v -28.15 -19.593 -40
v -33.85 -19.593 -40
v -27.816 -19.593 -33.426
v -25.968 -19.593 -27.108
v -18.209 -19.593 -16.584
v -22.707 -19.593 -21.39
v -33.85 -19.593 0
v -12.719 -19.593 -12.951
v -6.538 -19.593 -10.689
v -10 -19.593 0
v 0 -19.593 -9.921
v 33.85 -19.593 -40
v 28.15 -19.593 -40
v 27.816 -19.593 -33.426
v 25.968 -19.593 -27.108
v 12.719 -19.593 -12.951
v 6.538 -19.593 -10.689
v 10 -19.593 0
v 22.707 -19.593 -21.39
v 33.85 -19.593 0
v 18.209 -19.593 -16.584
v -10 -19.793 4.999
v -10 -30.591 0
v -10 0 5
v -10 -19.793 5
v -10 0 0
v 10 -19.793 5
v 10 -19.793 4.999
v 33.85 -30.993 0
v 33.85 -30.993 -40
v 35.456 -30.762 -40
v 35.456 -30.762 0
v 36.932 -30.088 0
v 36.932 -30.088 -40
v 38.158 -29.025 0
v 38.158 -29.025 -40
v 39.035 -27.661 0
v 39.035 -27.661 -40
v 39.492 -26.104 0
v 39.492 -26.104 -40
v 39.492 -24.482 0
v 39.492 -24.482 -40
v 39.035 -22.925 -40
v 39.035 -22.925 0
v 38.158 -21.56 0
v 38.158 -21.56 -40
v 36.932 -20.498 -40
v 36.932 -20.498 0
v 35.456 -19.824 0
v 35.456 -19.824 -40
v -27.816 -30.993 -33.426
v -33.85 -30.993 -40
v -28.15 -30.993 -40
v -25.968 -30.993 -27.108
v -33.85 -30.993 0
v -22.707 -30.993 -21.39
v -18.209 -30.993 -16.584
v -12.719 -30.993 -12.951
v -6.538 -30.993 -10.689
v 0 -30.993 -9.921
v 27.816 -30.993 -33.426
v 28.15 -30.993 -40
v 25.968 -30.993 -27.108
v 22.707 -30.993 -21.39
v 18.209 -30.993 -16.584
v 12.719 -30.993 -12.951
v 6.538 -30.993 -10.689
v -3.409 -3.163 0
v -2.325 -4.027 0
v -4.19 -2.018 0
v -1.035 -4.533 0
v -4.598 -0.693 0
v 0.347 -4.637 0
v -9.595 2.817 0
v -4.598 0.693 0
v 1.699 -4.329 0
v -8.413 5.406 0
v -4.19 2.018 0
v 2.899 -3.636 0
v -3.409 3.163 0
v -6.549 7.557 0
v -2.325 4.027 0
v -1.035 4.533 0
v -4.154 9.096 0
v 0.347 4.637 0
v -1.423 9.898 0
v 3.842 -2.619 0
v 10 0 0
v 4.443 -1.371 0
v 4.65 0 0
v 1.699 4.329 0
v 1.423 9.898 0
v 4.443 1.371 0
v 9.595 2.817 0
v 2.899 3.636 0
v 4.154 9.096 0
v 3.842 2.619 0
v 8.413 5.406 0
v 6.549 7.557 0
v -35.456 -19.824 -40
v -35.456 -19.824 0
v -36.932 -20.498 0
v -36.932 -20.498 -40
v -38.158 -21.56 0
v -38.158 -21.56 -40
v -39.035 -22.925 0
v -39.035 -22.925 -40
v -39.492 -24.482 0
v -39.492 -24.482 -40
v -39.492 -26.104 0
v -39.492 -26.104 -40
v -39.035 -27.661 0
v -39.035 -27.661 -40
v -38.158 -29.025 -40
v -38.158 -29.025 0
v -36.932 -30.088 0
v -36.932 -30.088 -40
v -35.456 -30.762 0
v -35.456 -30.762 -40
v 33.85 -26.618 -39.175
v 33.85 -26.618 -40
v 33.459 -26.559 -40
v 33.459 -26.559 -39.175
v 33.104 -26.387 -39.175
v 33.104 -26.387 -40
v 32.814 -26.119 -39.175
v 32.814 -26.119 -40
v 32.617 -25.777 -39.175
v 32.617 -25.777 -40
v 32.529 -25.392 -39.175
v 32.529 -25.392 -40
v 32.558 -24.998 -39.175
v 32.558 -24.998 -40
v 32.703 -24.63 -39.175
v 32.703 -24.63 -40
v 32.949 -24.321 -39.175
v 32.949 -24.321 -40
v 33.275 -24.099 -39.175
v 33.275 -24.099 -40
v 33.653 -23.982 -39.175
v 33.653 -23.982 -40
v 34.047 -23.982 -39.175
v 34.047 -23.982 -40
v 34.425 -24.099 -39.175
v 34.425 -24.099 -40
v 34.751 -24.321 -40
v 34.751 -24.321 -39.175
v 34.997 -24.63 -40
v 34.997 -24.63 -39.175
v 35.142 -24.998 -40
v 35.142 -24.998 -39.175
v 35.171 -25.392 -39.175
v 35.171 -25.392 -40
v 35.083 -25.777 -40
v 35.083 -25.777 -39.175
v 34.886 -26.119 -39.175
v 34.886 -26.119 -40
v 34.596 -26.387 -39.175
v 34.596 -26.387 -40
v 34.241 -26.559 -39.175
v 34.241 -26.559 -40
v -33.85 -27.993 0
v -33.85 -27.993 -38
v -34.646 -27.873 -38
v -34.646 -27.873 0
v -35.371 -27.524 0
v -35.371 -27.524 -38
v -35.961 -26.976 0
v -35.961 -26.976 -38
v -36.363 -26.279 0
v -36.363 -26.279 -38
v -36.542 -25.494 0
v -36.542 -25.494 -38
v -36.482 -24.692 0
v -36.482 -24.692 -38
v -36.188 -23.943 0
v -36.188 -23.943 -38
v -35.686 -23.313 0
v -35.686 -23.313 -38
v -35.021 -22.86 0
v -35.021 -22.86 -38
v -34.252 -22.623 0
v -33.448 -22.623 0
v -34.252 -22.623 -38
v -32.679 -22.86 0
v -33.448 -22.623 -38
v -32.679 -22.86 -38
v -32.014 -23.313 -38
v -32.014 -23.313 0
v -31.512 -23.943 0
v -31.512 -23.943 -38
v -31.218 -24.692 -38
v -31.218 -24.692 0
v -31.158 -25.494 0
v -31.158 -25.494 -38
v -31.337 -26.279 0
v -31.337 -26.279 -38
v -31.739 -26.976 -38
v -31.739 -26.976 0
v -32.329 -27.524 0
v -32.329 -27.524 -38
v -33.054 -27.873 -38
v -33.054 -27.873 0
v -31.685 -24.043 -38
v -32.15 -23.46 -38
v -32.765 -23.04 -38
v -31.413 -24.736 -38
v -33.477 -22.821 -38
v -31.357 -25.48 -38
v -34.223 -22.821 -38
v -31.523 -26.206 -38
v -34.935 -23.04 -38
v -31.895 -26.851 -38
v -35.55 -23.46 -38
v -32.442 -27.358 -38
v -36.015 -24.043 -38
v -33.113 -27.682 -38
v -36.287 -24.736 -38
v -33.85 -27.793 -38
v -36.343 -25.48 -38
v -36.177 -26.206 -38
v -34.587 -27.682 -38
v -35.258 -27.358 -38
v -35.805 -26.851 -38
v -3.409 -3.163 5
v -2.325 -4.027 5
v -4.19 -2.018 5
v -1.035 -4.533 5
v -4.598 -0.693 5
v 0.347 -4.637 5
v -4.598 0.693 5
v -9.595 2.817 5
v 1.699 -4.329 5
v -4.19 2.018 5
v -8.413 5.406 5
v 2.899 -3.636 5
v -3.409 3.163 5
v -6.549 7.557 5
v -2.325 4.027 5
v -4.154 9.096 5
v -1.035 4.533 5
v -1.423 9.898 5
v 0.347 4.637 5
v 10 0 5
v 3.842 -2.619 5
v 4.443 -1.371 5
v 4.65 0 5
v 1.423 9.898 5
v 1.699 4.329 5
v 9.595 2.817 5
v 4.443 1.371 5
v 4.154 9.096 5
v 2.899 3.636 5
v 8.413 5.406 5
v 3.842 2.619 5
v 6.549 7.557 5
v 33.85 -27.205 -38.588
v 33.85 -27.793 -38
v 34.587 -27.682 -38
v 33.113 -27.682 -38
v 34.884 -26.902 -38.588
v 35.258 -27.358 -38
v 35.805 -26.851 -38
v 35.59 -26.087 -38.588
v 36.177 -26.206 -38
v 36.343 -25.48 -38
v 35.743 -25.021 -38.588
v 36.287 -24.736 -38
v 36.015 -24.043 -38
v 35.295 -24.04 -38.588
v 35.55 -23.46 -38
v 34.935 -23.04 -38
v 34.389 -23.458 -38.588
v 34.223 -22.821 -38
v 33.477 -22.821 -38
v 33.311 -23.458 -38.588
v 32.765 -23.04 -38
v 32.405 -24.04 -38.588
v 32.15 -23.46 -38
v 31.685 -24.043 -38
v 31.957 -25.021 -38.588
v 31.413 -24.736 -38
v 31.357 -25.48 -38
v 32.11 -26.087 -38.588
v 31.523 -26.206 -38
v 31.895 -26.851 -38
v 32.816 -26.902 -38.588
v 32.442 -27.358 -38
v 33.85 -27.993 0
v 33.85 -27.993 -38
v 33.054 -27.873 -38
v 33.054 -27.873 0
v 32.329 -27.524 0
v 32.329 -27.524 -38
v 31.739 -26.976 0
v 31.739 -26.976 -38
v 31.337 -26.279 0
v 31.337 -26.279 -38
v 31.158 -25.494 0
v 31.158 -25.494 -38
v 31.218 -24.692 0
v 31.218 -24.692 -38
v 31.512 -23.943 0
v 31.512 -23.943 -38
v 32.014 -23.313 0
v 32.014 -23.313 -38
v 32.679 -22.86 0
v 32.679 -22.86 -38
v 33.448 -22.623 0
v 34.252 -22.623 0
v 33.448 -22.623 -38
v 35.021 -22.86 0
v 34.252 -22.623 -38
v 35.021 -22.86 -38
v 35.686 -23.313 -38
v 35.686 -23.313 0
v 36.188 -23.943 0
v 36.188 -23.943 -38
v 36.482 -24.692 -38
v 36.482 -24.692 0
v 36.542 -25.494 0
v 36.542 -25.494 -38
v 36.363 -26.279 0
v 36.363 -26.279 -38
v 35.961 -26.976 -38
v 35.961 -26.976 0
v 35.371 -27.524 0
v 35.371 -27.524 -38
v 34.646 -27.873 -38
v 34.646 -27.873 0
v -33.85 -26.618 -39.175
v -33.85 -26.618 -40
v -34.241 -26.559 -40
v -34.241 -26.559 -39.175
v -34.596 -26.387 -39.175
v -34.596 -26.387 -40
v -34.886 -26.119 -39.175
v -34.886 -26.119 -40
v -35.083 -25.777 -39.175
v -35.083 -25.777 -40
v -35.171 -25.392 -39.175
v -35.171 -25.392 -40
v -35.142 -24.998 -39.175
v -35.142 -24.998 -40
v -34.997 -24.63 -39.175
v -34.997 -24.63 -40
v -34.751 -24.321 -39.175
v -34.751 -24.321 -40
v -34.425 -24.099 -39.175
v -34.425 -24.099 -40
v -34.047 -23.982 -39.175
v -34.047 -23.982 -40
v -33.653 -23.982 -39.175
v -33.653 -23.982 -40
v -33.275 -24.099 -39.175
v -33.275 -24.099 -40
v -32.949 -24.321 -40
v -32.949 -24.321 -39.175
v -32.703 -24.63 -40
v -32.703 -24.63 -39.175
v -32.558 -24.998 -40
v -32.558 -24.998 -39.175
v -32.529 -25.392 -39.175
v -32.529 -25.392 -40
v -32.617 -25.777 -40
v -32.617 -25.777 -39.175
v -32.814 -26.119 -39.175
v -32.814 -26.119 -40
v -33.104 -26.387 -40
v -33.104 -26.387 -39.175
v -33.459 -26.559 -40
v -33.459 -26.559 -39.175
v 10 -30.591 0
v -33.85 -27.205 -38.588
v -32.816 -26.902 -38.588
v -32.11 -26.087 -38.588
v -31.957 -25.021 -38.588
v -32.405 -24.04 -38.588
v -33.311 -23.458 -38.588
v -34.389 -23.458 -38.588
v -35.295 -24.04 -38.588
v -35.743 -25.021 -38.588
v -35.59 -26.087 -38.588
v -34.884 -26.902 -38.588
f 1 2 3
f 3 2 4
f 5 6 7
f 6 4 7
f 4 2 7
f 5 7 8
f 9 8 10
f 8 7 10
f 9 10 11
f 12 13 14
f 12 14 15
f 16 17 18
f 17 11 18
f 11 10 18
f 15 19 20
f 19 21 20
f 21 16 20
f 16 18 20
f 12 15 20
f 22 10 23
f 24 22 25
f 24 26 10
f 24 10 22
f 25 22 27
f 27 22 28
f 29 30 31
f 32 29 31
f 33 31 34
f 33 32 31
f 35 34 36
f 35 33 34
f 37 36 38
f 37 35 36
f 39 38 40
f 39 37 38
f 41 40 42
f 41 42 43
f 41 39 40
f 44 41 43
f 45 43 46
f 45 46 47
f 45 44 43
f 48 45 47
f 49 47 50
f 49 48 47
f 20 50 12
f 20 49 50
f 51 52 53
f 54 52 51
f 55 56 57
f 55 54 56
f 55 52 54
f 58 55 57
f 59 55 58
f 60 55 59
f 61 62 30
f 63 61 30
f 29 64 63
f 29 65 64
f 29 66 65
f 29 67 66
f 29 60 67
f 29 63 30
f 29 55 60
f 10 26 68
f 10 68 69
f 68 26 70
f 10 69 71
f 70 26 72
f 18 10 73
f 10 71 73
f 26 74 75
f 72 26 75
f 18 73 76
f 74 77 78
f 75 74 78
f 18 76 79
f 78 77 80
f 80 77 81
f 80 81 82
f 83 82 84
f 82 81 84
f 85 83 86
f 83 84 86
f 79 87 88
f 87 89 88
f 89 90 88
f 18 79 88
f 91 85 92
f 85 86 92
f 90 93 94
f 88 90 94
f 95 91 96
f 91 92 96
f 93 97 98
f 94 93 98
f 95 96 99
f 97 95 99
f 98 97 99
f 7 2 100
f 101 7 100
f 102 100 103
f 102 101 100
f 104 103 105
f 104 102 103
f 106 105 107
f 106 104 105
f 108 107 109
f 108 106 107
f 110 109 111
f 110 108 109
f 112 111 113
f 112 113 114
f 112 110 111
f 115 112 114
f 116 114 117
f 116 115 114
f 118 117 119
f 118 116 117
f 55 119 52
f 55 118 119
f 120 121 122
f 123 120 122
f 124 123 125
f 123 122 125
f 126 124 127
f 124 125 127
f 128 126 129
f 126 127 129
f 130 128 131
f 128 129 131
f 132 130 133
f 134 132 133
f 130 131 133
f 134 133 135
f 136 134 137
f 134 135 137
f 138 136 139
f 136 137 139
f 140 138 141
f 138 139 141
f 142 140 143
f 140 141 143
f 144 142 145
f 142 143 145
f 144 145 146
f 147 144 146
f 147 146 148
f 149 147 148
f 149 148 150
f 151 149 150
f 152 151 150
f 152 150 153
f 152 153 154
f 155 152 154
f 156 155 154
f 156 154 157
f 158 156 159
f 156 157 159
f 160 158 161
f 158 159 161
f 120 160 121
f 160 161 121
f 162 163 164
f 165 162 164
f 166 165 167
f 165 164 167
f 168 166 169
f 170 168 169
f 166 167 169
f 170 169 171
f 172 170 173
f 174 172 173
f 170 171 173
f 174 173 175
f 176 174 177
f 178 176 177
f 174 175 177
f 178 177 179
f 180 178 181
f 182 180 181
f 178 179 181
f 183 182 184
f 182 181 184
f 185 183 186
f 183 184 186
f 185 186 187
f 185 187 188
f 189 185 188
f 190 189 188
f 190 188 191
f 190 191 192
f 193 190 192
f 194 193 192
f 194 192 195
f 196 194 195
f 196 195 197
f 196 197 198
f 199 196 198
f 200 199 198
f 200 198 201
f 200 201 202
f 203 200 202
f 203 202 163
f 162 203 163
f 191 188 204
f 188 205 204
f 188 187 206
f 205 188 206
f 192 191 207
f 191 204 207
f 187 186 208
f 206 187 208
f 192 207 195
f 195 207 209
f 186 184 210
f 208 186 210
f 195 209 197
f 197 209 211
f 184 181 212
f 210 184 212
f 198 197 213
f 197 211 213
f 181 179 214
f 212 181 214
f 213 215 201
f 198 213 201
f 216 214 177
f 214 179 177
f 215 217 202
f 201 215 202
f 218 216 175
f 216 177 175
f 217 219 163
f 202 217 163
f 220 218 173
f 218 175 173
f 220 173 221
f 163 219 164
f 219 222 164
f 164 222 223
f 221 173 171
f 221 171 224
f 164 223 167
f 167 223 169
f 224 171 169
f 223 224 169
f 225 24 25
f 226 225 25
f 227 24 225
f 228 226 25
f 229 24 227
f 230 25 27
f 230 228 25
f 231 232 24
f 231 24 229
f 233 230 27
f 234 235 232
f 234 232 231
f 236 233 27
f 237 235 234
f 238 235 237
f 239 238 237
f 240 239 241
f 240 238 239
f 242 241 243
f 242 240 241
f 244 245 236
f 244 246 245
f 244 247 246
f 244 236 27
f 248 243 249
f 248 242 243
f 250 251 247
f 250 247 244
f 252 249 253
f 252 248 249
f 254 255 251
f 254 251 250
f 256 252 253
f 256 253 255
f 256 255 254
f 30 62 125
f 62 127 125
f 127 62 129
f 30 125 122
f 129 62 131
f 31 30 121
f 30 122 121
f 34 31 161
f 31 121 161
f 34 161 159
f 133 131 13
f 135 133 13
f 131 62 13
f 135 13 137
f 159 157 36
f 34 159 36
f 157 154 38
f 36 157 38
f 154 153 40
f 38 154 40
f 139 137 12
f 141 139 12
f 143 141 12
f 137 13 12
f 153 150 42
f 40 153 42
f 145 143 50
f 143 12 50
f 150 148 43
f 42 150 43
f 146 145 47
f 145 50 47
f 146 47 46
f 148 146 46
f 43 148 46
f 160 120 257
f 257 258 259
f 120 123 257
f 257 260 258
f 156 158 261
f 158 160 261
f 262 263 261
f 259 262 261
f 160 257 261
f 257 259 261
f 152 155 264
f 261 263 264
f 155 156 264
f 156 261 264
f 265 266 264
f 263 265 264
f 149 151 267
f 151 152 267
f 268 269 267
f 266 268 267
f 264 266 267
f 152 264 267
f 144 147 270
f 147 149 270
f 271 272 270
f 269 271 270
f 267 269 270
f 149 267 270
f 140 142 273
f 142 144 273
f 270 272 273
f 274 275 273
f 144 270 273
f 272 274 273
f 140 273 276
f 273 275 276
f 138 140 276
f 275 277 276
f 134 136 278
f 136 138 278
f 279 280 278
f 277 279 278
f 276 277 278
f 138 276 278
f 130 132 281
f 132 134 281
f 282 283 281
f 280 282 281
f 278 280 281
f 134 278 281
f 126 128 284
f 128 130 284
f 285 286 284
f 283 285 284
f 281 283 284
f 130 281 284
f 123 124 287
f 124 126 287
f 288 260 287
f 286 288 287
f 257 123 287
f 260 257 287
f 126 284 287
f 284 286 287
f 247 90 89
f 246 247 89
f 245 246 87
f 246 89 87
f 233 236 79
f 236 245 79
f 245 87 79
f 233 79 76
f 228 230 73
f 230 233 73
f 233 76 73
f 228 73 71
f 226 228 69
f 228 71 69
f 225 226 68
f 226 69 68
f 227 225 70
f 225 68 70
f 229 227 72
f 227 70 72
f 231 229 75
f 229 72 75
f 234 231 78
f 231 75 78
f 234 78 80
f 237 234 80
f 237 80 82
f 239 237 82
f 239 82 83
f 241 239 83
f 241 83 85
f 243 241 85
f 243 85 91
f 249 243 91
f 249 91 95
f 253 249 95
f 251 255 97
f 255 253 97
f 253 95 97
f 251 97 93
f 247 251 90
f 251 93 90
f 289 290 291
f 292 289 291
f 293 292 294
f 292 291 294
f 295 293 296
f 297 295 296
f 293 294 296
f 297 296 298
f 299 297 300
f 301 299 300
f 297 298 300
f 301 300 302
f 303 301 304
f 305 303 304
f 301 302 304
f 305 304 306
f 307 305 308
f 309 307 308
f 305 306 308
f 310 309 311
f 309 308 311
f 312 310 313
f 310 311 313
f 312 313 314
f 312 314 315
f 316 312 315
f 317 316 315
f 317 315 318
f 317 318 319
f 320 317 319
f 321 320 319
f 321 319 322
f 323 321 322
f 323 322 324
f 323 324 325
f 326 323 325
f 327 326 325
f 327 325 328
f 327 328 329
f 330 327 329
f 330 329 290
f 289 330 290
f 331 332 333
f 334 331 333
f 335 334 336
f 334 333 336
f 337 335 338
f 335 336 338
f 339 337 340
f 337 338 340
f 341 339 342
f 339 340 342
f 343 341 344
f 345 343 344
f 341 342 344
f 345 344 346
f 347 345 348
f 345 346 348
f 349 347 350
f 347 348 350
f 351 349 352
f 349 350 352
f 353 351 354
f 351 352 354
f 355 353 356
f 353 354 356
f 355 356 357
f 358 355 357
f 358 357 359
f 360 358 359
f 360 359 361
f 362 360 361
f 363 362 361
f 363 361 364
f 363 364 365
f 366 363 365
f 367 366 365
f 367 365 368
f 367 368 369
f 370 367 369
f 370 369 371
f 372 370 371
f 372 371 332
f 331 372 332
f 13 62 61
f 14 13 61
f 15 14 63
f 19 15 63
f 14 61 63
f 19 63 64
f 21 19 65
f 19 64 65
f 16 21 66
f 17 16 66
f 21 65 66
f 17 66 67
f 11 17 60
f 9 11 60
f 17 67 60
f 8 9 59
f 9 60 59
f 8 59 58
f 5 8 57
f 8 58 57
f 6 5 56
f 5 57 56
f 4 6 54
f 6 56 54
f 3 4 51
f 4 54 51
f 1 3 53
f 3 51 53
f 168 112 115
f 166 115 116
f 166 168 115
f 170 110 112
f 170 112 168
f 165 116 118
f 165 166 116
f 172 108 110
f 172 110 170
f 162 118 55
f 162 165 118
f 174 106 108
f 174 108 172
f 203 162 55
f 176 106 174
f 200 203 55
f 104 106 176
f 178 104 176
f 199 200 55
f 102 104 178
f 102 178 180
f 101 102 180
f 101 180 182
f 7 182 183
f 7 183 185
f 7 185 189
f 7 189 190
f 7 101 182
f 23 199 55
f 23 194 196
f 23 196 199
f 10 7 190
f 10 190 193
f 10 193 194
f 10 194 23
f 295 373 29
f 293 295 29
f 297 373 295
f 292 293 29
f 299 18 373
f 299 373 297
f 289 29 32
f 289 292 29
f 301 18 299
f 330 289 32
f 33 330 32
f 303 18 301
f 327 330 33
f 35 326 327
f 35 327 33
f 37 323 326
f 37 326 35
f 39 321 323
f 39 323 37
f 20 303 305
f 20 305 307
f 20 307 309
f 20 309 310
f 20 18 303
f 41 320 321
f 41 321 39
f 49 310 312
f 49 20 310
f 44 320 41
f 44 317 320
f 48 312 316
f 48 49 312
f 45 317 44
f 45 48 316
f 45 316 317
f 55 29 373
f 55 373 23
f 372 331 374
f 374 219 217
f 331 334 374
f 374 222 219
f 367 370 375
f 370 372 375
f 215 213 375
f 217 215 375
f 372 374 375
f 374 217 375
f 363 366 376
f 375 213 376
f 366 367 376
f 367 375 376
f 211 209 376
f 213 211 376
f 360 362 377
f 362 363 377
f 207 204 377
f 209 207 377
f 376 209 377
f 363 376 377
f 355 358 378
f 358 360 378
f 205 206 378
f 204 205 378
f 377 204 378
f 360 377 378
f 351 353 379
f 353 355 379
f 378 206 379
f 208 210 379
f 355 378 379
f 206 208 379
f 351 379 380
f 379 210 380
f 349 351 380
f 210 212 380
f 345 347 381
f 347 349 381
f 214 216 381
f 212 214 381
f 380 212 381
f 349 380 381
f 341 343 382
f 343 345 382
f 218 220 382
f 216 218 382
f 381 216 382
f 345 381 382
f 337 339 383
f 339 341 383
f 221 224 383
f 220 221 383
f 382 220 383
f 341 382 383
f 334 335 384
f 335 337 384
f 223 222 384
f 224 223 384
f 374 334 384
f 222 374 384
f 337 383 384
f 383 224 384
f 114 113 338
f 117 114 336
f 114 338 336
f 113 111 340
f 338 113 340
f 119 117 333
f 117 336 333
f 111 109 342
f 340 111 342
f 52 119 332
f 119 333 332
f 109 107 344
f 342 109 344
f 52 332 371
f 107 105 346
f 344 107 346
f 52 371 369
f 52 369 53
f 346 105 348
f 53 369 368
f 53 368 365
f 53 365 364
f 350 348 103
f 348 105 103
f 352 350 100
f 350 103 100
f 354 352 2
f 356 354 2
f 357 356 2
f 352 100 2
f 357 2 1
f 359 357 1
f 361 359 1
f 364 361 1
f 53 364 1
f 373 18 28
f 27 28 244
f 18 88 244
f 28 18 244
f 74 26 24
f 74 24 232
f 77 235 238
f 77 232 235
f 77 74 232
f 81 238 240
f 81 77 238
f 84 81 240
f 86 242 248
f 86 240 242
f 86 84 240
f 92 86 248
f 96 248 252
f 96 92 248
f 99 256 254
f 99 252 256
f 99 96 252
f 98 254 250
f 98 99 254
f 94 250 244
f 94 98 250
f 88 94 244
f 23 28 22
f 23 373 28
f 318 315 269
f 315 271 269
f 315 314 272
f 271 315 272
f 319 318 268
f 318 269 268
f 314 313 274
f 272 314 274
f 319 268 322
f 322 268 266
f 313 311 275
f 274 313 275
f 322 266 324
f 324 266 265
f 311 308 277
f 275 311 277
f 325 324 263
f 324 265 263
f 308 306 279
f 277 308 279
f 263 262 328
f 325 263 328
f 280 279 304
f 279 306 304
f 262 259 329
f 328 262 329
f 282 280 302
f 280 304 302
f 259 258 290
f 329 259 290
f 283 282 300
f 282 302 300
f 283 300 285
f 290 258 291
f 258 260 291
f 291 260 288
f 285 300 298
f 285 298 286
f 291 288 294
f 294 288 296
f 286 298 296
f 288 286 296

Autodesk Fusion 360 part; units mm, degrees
sketch "Sketch1" plane through (0, 0, 0) normal (0, 0, 1) x (1, 0, 0)
  circle A0 centre (0, 0) radius 4.65
  circle A1 centre (0, 0) radius 10
  line L0 (-33.85, -25.2927) -> (33.85, -25.2927)
  circle A2 centre (33.85, -25.2927) radius 5.7
  circle A3 centre (-33.85, -25.2927) radius 5.7
  line L1 (-33.85, -30.9927) -> (33.85, -30.9927)
  line L2 (-33.85, -19.5927) -> (33.85, -19.5927)
  line L3 (10, -19.5927) -> (10, 0)
  line L4 (-10, -19.5927) -> (-10, 0)
  line L5 (0.7275, -4.5927) -> (0.7275, -19.5927) construction
  line L6 (0, 0) -> (0, -19.5927) construction
  dimension "d2" = 9.3
  dimension "d3" = 20
  dimension "d9" = 67.7
  dimension "d13" = 11.4
  dimension "d14" = 11.4
  dimension "d37" = 15
extrude "Extrude1" add sketch "Sketch1" along normal blind 5 contours A1 makes body 1
extrude "Extrude2" add sketch "Sketch1" along normal blind 5 contours A1 L2 L3 L4 bodies 1
extrude "Extrude3" add sketch "Sketch1" against normal blind 40 separate body contours L0 A2 A3 L2 | A2 | A3 | L0 A2 A3 L1 makes body 2
extrude "Extrude4" add 1 faces at (-3.3333, -19.5927, 1.6667) along direction (0, -1, 0) blind 0.2 on bodies 1 bodies 1 2
chamfer "Chamfer1" distance 5 distance2 10.8 1 edges at (0, -19.7927, 0) measured on face at (-3.3333, -19.7927, 1.6667) on bodies 1
hole "Hole1" at (-33.85, -25.2927, 0) at (33.85, -25.2927, 0) direction (0, 0, -1) diameter 5.4 depth 38 tip angle 180 bodies 1
hole "Hole2" at (33.85, -25.2927, -38) direction (0, 0, -1) diameter 2.65 depth 2 tip angle 180 countersink diameter 5 countersink angle 90 bodies 1
hole "Hole3" at (-33.85, -25.2927, -38) direction (0, 0, -1) diameter 2.65 depth 2 tip angle 180 countersink diameter 5 countersink angle 90 bodies 1
sketch "Sketch2" plane through (0, -30.9927, 0) normal (0, -1, 0) x (1, 0, 0)
  line L0 (33.85, 0) -> (-33.85, 0)
  line L1 (-33.85, 0) -> (-33.85, -40)
  line L2 (-33.85, -40) -> (33.85, -40)
  line L3 (33.85, -40) -> (33.85, 0)
  line L4 (-33.85, -40) -> (-28.15, -40) construction
  line L5 (33.85, -40) -> (28.15, -40) construction
  arc A0 (28.15, -40) -> (-28.15, -40) centre (0, -38.1329) ccw
  dimension "d39" = 5.7
  dimension "d40" = 5.7
extrude "Extrude5" cut sketch "Sketch2" against normal up to surface (11.4 mm away) contours L2 A0 bodies 1
equation "stemdia = 9.2 mm"
equation "d2 = stemdia + 0.1 mm"
equation "screwwidth = 67.7 mm"
equation "screwheight = 5.6 mm"
equation "d9 = screwwidth"
equation "shiftscrewdia = 2.55 mm"
equation "shiftiscrewdepth = 2 mm"
equation "d13 = standoffwidth"
equation "d14 = standoffwidth"
equation "standoff = 40 mm"
equation "d18 = -standoff"
equation "d23 = standoff - 2 mm"
equation "d36 = ( 5.5 * 2 ) * 1 mm - 0.2 mm"
equation "standoffwidth = 11.4 mm"
equation "d39 = standoffwidth / 2"
equation "d40 = standoffwidth / 2"
